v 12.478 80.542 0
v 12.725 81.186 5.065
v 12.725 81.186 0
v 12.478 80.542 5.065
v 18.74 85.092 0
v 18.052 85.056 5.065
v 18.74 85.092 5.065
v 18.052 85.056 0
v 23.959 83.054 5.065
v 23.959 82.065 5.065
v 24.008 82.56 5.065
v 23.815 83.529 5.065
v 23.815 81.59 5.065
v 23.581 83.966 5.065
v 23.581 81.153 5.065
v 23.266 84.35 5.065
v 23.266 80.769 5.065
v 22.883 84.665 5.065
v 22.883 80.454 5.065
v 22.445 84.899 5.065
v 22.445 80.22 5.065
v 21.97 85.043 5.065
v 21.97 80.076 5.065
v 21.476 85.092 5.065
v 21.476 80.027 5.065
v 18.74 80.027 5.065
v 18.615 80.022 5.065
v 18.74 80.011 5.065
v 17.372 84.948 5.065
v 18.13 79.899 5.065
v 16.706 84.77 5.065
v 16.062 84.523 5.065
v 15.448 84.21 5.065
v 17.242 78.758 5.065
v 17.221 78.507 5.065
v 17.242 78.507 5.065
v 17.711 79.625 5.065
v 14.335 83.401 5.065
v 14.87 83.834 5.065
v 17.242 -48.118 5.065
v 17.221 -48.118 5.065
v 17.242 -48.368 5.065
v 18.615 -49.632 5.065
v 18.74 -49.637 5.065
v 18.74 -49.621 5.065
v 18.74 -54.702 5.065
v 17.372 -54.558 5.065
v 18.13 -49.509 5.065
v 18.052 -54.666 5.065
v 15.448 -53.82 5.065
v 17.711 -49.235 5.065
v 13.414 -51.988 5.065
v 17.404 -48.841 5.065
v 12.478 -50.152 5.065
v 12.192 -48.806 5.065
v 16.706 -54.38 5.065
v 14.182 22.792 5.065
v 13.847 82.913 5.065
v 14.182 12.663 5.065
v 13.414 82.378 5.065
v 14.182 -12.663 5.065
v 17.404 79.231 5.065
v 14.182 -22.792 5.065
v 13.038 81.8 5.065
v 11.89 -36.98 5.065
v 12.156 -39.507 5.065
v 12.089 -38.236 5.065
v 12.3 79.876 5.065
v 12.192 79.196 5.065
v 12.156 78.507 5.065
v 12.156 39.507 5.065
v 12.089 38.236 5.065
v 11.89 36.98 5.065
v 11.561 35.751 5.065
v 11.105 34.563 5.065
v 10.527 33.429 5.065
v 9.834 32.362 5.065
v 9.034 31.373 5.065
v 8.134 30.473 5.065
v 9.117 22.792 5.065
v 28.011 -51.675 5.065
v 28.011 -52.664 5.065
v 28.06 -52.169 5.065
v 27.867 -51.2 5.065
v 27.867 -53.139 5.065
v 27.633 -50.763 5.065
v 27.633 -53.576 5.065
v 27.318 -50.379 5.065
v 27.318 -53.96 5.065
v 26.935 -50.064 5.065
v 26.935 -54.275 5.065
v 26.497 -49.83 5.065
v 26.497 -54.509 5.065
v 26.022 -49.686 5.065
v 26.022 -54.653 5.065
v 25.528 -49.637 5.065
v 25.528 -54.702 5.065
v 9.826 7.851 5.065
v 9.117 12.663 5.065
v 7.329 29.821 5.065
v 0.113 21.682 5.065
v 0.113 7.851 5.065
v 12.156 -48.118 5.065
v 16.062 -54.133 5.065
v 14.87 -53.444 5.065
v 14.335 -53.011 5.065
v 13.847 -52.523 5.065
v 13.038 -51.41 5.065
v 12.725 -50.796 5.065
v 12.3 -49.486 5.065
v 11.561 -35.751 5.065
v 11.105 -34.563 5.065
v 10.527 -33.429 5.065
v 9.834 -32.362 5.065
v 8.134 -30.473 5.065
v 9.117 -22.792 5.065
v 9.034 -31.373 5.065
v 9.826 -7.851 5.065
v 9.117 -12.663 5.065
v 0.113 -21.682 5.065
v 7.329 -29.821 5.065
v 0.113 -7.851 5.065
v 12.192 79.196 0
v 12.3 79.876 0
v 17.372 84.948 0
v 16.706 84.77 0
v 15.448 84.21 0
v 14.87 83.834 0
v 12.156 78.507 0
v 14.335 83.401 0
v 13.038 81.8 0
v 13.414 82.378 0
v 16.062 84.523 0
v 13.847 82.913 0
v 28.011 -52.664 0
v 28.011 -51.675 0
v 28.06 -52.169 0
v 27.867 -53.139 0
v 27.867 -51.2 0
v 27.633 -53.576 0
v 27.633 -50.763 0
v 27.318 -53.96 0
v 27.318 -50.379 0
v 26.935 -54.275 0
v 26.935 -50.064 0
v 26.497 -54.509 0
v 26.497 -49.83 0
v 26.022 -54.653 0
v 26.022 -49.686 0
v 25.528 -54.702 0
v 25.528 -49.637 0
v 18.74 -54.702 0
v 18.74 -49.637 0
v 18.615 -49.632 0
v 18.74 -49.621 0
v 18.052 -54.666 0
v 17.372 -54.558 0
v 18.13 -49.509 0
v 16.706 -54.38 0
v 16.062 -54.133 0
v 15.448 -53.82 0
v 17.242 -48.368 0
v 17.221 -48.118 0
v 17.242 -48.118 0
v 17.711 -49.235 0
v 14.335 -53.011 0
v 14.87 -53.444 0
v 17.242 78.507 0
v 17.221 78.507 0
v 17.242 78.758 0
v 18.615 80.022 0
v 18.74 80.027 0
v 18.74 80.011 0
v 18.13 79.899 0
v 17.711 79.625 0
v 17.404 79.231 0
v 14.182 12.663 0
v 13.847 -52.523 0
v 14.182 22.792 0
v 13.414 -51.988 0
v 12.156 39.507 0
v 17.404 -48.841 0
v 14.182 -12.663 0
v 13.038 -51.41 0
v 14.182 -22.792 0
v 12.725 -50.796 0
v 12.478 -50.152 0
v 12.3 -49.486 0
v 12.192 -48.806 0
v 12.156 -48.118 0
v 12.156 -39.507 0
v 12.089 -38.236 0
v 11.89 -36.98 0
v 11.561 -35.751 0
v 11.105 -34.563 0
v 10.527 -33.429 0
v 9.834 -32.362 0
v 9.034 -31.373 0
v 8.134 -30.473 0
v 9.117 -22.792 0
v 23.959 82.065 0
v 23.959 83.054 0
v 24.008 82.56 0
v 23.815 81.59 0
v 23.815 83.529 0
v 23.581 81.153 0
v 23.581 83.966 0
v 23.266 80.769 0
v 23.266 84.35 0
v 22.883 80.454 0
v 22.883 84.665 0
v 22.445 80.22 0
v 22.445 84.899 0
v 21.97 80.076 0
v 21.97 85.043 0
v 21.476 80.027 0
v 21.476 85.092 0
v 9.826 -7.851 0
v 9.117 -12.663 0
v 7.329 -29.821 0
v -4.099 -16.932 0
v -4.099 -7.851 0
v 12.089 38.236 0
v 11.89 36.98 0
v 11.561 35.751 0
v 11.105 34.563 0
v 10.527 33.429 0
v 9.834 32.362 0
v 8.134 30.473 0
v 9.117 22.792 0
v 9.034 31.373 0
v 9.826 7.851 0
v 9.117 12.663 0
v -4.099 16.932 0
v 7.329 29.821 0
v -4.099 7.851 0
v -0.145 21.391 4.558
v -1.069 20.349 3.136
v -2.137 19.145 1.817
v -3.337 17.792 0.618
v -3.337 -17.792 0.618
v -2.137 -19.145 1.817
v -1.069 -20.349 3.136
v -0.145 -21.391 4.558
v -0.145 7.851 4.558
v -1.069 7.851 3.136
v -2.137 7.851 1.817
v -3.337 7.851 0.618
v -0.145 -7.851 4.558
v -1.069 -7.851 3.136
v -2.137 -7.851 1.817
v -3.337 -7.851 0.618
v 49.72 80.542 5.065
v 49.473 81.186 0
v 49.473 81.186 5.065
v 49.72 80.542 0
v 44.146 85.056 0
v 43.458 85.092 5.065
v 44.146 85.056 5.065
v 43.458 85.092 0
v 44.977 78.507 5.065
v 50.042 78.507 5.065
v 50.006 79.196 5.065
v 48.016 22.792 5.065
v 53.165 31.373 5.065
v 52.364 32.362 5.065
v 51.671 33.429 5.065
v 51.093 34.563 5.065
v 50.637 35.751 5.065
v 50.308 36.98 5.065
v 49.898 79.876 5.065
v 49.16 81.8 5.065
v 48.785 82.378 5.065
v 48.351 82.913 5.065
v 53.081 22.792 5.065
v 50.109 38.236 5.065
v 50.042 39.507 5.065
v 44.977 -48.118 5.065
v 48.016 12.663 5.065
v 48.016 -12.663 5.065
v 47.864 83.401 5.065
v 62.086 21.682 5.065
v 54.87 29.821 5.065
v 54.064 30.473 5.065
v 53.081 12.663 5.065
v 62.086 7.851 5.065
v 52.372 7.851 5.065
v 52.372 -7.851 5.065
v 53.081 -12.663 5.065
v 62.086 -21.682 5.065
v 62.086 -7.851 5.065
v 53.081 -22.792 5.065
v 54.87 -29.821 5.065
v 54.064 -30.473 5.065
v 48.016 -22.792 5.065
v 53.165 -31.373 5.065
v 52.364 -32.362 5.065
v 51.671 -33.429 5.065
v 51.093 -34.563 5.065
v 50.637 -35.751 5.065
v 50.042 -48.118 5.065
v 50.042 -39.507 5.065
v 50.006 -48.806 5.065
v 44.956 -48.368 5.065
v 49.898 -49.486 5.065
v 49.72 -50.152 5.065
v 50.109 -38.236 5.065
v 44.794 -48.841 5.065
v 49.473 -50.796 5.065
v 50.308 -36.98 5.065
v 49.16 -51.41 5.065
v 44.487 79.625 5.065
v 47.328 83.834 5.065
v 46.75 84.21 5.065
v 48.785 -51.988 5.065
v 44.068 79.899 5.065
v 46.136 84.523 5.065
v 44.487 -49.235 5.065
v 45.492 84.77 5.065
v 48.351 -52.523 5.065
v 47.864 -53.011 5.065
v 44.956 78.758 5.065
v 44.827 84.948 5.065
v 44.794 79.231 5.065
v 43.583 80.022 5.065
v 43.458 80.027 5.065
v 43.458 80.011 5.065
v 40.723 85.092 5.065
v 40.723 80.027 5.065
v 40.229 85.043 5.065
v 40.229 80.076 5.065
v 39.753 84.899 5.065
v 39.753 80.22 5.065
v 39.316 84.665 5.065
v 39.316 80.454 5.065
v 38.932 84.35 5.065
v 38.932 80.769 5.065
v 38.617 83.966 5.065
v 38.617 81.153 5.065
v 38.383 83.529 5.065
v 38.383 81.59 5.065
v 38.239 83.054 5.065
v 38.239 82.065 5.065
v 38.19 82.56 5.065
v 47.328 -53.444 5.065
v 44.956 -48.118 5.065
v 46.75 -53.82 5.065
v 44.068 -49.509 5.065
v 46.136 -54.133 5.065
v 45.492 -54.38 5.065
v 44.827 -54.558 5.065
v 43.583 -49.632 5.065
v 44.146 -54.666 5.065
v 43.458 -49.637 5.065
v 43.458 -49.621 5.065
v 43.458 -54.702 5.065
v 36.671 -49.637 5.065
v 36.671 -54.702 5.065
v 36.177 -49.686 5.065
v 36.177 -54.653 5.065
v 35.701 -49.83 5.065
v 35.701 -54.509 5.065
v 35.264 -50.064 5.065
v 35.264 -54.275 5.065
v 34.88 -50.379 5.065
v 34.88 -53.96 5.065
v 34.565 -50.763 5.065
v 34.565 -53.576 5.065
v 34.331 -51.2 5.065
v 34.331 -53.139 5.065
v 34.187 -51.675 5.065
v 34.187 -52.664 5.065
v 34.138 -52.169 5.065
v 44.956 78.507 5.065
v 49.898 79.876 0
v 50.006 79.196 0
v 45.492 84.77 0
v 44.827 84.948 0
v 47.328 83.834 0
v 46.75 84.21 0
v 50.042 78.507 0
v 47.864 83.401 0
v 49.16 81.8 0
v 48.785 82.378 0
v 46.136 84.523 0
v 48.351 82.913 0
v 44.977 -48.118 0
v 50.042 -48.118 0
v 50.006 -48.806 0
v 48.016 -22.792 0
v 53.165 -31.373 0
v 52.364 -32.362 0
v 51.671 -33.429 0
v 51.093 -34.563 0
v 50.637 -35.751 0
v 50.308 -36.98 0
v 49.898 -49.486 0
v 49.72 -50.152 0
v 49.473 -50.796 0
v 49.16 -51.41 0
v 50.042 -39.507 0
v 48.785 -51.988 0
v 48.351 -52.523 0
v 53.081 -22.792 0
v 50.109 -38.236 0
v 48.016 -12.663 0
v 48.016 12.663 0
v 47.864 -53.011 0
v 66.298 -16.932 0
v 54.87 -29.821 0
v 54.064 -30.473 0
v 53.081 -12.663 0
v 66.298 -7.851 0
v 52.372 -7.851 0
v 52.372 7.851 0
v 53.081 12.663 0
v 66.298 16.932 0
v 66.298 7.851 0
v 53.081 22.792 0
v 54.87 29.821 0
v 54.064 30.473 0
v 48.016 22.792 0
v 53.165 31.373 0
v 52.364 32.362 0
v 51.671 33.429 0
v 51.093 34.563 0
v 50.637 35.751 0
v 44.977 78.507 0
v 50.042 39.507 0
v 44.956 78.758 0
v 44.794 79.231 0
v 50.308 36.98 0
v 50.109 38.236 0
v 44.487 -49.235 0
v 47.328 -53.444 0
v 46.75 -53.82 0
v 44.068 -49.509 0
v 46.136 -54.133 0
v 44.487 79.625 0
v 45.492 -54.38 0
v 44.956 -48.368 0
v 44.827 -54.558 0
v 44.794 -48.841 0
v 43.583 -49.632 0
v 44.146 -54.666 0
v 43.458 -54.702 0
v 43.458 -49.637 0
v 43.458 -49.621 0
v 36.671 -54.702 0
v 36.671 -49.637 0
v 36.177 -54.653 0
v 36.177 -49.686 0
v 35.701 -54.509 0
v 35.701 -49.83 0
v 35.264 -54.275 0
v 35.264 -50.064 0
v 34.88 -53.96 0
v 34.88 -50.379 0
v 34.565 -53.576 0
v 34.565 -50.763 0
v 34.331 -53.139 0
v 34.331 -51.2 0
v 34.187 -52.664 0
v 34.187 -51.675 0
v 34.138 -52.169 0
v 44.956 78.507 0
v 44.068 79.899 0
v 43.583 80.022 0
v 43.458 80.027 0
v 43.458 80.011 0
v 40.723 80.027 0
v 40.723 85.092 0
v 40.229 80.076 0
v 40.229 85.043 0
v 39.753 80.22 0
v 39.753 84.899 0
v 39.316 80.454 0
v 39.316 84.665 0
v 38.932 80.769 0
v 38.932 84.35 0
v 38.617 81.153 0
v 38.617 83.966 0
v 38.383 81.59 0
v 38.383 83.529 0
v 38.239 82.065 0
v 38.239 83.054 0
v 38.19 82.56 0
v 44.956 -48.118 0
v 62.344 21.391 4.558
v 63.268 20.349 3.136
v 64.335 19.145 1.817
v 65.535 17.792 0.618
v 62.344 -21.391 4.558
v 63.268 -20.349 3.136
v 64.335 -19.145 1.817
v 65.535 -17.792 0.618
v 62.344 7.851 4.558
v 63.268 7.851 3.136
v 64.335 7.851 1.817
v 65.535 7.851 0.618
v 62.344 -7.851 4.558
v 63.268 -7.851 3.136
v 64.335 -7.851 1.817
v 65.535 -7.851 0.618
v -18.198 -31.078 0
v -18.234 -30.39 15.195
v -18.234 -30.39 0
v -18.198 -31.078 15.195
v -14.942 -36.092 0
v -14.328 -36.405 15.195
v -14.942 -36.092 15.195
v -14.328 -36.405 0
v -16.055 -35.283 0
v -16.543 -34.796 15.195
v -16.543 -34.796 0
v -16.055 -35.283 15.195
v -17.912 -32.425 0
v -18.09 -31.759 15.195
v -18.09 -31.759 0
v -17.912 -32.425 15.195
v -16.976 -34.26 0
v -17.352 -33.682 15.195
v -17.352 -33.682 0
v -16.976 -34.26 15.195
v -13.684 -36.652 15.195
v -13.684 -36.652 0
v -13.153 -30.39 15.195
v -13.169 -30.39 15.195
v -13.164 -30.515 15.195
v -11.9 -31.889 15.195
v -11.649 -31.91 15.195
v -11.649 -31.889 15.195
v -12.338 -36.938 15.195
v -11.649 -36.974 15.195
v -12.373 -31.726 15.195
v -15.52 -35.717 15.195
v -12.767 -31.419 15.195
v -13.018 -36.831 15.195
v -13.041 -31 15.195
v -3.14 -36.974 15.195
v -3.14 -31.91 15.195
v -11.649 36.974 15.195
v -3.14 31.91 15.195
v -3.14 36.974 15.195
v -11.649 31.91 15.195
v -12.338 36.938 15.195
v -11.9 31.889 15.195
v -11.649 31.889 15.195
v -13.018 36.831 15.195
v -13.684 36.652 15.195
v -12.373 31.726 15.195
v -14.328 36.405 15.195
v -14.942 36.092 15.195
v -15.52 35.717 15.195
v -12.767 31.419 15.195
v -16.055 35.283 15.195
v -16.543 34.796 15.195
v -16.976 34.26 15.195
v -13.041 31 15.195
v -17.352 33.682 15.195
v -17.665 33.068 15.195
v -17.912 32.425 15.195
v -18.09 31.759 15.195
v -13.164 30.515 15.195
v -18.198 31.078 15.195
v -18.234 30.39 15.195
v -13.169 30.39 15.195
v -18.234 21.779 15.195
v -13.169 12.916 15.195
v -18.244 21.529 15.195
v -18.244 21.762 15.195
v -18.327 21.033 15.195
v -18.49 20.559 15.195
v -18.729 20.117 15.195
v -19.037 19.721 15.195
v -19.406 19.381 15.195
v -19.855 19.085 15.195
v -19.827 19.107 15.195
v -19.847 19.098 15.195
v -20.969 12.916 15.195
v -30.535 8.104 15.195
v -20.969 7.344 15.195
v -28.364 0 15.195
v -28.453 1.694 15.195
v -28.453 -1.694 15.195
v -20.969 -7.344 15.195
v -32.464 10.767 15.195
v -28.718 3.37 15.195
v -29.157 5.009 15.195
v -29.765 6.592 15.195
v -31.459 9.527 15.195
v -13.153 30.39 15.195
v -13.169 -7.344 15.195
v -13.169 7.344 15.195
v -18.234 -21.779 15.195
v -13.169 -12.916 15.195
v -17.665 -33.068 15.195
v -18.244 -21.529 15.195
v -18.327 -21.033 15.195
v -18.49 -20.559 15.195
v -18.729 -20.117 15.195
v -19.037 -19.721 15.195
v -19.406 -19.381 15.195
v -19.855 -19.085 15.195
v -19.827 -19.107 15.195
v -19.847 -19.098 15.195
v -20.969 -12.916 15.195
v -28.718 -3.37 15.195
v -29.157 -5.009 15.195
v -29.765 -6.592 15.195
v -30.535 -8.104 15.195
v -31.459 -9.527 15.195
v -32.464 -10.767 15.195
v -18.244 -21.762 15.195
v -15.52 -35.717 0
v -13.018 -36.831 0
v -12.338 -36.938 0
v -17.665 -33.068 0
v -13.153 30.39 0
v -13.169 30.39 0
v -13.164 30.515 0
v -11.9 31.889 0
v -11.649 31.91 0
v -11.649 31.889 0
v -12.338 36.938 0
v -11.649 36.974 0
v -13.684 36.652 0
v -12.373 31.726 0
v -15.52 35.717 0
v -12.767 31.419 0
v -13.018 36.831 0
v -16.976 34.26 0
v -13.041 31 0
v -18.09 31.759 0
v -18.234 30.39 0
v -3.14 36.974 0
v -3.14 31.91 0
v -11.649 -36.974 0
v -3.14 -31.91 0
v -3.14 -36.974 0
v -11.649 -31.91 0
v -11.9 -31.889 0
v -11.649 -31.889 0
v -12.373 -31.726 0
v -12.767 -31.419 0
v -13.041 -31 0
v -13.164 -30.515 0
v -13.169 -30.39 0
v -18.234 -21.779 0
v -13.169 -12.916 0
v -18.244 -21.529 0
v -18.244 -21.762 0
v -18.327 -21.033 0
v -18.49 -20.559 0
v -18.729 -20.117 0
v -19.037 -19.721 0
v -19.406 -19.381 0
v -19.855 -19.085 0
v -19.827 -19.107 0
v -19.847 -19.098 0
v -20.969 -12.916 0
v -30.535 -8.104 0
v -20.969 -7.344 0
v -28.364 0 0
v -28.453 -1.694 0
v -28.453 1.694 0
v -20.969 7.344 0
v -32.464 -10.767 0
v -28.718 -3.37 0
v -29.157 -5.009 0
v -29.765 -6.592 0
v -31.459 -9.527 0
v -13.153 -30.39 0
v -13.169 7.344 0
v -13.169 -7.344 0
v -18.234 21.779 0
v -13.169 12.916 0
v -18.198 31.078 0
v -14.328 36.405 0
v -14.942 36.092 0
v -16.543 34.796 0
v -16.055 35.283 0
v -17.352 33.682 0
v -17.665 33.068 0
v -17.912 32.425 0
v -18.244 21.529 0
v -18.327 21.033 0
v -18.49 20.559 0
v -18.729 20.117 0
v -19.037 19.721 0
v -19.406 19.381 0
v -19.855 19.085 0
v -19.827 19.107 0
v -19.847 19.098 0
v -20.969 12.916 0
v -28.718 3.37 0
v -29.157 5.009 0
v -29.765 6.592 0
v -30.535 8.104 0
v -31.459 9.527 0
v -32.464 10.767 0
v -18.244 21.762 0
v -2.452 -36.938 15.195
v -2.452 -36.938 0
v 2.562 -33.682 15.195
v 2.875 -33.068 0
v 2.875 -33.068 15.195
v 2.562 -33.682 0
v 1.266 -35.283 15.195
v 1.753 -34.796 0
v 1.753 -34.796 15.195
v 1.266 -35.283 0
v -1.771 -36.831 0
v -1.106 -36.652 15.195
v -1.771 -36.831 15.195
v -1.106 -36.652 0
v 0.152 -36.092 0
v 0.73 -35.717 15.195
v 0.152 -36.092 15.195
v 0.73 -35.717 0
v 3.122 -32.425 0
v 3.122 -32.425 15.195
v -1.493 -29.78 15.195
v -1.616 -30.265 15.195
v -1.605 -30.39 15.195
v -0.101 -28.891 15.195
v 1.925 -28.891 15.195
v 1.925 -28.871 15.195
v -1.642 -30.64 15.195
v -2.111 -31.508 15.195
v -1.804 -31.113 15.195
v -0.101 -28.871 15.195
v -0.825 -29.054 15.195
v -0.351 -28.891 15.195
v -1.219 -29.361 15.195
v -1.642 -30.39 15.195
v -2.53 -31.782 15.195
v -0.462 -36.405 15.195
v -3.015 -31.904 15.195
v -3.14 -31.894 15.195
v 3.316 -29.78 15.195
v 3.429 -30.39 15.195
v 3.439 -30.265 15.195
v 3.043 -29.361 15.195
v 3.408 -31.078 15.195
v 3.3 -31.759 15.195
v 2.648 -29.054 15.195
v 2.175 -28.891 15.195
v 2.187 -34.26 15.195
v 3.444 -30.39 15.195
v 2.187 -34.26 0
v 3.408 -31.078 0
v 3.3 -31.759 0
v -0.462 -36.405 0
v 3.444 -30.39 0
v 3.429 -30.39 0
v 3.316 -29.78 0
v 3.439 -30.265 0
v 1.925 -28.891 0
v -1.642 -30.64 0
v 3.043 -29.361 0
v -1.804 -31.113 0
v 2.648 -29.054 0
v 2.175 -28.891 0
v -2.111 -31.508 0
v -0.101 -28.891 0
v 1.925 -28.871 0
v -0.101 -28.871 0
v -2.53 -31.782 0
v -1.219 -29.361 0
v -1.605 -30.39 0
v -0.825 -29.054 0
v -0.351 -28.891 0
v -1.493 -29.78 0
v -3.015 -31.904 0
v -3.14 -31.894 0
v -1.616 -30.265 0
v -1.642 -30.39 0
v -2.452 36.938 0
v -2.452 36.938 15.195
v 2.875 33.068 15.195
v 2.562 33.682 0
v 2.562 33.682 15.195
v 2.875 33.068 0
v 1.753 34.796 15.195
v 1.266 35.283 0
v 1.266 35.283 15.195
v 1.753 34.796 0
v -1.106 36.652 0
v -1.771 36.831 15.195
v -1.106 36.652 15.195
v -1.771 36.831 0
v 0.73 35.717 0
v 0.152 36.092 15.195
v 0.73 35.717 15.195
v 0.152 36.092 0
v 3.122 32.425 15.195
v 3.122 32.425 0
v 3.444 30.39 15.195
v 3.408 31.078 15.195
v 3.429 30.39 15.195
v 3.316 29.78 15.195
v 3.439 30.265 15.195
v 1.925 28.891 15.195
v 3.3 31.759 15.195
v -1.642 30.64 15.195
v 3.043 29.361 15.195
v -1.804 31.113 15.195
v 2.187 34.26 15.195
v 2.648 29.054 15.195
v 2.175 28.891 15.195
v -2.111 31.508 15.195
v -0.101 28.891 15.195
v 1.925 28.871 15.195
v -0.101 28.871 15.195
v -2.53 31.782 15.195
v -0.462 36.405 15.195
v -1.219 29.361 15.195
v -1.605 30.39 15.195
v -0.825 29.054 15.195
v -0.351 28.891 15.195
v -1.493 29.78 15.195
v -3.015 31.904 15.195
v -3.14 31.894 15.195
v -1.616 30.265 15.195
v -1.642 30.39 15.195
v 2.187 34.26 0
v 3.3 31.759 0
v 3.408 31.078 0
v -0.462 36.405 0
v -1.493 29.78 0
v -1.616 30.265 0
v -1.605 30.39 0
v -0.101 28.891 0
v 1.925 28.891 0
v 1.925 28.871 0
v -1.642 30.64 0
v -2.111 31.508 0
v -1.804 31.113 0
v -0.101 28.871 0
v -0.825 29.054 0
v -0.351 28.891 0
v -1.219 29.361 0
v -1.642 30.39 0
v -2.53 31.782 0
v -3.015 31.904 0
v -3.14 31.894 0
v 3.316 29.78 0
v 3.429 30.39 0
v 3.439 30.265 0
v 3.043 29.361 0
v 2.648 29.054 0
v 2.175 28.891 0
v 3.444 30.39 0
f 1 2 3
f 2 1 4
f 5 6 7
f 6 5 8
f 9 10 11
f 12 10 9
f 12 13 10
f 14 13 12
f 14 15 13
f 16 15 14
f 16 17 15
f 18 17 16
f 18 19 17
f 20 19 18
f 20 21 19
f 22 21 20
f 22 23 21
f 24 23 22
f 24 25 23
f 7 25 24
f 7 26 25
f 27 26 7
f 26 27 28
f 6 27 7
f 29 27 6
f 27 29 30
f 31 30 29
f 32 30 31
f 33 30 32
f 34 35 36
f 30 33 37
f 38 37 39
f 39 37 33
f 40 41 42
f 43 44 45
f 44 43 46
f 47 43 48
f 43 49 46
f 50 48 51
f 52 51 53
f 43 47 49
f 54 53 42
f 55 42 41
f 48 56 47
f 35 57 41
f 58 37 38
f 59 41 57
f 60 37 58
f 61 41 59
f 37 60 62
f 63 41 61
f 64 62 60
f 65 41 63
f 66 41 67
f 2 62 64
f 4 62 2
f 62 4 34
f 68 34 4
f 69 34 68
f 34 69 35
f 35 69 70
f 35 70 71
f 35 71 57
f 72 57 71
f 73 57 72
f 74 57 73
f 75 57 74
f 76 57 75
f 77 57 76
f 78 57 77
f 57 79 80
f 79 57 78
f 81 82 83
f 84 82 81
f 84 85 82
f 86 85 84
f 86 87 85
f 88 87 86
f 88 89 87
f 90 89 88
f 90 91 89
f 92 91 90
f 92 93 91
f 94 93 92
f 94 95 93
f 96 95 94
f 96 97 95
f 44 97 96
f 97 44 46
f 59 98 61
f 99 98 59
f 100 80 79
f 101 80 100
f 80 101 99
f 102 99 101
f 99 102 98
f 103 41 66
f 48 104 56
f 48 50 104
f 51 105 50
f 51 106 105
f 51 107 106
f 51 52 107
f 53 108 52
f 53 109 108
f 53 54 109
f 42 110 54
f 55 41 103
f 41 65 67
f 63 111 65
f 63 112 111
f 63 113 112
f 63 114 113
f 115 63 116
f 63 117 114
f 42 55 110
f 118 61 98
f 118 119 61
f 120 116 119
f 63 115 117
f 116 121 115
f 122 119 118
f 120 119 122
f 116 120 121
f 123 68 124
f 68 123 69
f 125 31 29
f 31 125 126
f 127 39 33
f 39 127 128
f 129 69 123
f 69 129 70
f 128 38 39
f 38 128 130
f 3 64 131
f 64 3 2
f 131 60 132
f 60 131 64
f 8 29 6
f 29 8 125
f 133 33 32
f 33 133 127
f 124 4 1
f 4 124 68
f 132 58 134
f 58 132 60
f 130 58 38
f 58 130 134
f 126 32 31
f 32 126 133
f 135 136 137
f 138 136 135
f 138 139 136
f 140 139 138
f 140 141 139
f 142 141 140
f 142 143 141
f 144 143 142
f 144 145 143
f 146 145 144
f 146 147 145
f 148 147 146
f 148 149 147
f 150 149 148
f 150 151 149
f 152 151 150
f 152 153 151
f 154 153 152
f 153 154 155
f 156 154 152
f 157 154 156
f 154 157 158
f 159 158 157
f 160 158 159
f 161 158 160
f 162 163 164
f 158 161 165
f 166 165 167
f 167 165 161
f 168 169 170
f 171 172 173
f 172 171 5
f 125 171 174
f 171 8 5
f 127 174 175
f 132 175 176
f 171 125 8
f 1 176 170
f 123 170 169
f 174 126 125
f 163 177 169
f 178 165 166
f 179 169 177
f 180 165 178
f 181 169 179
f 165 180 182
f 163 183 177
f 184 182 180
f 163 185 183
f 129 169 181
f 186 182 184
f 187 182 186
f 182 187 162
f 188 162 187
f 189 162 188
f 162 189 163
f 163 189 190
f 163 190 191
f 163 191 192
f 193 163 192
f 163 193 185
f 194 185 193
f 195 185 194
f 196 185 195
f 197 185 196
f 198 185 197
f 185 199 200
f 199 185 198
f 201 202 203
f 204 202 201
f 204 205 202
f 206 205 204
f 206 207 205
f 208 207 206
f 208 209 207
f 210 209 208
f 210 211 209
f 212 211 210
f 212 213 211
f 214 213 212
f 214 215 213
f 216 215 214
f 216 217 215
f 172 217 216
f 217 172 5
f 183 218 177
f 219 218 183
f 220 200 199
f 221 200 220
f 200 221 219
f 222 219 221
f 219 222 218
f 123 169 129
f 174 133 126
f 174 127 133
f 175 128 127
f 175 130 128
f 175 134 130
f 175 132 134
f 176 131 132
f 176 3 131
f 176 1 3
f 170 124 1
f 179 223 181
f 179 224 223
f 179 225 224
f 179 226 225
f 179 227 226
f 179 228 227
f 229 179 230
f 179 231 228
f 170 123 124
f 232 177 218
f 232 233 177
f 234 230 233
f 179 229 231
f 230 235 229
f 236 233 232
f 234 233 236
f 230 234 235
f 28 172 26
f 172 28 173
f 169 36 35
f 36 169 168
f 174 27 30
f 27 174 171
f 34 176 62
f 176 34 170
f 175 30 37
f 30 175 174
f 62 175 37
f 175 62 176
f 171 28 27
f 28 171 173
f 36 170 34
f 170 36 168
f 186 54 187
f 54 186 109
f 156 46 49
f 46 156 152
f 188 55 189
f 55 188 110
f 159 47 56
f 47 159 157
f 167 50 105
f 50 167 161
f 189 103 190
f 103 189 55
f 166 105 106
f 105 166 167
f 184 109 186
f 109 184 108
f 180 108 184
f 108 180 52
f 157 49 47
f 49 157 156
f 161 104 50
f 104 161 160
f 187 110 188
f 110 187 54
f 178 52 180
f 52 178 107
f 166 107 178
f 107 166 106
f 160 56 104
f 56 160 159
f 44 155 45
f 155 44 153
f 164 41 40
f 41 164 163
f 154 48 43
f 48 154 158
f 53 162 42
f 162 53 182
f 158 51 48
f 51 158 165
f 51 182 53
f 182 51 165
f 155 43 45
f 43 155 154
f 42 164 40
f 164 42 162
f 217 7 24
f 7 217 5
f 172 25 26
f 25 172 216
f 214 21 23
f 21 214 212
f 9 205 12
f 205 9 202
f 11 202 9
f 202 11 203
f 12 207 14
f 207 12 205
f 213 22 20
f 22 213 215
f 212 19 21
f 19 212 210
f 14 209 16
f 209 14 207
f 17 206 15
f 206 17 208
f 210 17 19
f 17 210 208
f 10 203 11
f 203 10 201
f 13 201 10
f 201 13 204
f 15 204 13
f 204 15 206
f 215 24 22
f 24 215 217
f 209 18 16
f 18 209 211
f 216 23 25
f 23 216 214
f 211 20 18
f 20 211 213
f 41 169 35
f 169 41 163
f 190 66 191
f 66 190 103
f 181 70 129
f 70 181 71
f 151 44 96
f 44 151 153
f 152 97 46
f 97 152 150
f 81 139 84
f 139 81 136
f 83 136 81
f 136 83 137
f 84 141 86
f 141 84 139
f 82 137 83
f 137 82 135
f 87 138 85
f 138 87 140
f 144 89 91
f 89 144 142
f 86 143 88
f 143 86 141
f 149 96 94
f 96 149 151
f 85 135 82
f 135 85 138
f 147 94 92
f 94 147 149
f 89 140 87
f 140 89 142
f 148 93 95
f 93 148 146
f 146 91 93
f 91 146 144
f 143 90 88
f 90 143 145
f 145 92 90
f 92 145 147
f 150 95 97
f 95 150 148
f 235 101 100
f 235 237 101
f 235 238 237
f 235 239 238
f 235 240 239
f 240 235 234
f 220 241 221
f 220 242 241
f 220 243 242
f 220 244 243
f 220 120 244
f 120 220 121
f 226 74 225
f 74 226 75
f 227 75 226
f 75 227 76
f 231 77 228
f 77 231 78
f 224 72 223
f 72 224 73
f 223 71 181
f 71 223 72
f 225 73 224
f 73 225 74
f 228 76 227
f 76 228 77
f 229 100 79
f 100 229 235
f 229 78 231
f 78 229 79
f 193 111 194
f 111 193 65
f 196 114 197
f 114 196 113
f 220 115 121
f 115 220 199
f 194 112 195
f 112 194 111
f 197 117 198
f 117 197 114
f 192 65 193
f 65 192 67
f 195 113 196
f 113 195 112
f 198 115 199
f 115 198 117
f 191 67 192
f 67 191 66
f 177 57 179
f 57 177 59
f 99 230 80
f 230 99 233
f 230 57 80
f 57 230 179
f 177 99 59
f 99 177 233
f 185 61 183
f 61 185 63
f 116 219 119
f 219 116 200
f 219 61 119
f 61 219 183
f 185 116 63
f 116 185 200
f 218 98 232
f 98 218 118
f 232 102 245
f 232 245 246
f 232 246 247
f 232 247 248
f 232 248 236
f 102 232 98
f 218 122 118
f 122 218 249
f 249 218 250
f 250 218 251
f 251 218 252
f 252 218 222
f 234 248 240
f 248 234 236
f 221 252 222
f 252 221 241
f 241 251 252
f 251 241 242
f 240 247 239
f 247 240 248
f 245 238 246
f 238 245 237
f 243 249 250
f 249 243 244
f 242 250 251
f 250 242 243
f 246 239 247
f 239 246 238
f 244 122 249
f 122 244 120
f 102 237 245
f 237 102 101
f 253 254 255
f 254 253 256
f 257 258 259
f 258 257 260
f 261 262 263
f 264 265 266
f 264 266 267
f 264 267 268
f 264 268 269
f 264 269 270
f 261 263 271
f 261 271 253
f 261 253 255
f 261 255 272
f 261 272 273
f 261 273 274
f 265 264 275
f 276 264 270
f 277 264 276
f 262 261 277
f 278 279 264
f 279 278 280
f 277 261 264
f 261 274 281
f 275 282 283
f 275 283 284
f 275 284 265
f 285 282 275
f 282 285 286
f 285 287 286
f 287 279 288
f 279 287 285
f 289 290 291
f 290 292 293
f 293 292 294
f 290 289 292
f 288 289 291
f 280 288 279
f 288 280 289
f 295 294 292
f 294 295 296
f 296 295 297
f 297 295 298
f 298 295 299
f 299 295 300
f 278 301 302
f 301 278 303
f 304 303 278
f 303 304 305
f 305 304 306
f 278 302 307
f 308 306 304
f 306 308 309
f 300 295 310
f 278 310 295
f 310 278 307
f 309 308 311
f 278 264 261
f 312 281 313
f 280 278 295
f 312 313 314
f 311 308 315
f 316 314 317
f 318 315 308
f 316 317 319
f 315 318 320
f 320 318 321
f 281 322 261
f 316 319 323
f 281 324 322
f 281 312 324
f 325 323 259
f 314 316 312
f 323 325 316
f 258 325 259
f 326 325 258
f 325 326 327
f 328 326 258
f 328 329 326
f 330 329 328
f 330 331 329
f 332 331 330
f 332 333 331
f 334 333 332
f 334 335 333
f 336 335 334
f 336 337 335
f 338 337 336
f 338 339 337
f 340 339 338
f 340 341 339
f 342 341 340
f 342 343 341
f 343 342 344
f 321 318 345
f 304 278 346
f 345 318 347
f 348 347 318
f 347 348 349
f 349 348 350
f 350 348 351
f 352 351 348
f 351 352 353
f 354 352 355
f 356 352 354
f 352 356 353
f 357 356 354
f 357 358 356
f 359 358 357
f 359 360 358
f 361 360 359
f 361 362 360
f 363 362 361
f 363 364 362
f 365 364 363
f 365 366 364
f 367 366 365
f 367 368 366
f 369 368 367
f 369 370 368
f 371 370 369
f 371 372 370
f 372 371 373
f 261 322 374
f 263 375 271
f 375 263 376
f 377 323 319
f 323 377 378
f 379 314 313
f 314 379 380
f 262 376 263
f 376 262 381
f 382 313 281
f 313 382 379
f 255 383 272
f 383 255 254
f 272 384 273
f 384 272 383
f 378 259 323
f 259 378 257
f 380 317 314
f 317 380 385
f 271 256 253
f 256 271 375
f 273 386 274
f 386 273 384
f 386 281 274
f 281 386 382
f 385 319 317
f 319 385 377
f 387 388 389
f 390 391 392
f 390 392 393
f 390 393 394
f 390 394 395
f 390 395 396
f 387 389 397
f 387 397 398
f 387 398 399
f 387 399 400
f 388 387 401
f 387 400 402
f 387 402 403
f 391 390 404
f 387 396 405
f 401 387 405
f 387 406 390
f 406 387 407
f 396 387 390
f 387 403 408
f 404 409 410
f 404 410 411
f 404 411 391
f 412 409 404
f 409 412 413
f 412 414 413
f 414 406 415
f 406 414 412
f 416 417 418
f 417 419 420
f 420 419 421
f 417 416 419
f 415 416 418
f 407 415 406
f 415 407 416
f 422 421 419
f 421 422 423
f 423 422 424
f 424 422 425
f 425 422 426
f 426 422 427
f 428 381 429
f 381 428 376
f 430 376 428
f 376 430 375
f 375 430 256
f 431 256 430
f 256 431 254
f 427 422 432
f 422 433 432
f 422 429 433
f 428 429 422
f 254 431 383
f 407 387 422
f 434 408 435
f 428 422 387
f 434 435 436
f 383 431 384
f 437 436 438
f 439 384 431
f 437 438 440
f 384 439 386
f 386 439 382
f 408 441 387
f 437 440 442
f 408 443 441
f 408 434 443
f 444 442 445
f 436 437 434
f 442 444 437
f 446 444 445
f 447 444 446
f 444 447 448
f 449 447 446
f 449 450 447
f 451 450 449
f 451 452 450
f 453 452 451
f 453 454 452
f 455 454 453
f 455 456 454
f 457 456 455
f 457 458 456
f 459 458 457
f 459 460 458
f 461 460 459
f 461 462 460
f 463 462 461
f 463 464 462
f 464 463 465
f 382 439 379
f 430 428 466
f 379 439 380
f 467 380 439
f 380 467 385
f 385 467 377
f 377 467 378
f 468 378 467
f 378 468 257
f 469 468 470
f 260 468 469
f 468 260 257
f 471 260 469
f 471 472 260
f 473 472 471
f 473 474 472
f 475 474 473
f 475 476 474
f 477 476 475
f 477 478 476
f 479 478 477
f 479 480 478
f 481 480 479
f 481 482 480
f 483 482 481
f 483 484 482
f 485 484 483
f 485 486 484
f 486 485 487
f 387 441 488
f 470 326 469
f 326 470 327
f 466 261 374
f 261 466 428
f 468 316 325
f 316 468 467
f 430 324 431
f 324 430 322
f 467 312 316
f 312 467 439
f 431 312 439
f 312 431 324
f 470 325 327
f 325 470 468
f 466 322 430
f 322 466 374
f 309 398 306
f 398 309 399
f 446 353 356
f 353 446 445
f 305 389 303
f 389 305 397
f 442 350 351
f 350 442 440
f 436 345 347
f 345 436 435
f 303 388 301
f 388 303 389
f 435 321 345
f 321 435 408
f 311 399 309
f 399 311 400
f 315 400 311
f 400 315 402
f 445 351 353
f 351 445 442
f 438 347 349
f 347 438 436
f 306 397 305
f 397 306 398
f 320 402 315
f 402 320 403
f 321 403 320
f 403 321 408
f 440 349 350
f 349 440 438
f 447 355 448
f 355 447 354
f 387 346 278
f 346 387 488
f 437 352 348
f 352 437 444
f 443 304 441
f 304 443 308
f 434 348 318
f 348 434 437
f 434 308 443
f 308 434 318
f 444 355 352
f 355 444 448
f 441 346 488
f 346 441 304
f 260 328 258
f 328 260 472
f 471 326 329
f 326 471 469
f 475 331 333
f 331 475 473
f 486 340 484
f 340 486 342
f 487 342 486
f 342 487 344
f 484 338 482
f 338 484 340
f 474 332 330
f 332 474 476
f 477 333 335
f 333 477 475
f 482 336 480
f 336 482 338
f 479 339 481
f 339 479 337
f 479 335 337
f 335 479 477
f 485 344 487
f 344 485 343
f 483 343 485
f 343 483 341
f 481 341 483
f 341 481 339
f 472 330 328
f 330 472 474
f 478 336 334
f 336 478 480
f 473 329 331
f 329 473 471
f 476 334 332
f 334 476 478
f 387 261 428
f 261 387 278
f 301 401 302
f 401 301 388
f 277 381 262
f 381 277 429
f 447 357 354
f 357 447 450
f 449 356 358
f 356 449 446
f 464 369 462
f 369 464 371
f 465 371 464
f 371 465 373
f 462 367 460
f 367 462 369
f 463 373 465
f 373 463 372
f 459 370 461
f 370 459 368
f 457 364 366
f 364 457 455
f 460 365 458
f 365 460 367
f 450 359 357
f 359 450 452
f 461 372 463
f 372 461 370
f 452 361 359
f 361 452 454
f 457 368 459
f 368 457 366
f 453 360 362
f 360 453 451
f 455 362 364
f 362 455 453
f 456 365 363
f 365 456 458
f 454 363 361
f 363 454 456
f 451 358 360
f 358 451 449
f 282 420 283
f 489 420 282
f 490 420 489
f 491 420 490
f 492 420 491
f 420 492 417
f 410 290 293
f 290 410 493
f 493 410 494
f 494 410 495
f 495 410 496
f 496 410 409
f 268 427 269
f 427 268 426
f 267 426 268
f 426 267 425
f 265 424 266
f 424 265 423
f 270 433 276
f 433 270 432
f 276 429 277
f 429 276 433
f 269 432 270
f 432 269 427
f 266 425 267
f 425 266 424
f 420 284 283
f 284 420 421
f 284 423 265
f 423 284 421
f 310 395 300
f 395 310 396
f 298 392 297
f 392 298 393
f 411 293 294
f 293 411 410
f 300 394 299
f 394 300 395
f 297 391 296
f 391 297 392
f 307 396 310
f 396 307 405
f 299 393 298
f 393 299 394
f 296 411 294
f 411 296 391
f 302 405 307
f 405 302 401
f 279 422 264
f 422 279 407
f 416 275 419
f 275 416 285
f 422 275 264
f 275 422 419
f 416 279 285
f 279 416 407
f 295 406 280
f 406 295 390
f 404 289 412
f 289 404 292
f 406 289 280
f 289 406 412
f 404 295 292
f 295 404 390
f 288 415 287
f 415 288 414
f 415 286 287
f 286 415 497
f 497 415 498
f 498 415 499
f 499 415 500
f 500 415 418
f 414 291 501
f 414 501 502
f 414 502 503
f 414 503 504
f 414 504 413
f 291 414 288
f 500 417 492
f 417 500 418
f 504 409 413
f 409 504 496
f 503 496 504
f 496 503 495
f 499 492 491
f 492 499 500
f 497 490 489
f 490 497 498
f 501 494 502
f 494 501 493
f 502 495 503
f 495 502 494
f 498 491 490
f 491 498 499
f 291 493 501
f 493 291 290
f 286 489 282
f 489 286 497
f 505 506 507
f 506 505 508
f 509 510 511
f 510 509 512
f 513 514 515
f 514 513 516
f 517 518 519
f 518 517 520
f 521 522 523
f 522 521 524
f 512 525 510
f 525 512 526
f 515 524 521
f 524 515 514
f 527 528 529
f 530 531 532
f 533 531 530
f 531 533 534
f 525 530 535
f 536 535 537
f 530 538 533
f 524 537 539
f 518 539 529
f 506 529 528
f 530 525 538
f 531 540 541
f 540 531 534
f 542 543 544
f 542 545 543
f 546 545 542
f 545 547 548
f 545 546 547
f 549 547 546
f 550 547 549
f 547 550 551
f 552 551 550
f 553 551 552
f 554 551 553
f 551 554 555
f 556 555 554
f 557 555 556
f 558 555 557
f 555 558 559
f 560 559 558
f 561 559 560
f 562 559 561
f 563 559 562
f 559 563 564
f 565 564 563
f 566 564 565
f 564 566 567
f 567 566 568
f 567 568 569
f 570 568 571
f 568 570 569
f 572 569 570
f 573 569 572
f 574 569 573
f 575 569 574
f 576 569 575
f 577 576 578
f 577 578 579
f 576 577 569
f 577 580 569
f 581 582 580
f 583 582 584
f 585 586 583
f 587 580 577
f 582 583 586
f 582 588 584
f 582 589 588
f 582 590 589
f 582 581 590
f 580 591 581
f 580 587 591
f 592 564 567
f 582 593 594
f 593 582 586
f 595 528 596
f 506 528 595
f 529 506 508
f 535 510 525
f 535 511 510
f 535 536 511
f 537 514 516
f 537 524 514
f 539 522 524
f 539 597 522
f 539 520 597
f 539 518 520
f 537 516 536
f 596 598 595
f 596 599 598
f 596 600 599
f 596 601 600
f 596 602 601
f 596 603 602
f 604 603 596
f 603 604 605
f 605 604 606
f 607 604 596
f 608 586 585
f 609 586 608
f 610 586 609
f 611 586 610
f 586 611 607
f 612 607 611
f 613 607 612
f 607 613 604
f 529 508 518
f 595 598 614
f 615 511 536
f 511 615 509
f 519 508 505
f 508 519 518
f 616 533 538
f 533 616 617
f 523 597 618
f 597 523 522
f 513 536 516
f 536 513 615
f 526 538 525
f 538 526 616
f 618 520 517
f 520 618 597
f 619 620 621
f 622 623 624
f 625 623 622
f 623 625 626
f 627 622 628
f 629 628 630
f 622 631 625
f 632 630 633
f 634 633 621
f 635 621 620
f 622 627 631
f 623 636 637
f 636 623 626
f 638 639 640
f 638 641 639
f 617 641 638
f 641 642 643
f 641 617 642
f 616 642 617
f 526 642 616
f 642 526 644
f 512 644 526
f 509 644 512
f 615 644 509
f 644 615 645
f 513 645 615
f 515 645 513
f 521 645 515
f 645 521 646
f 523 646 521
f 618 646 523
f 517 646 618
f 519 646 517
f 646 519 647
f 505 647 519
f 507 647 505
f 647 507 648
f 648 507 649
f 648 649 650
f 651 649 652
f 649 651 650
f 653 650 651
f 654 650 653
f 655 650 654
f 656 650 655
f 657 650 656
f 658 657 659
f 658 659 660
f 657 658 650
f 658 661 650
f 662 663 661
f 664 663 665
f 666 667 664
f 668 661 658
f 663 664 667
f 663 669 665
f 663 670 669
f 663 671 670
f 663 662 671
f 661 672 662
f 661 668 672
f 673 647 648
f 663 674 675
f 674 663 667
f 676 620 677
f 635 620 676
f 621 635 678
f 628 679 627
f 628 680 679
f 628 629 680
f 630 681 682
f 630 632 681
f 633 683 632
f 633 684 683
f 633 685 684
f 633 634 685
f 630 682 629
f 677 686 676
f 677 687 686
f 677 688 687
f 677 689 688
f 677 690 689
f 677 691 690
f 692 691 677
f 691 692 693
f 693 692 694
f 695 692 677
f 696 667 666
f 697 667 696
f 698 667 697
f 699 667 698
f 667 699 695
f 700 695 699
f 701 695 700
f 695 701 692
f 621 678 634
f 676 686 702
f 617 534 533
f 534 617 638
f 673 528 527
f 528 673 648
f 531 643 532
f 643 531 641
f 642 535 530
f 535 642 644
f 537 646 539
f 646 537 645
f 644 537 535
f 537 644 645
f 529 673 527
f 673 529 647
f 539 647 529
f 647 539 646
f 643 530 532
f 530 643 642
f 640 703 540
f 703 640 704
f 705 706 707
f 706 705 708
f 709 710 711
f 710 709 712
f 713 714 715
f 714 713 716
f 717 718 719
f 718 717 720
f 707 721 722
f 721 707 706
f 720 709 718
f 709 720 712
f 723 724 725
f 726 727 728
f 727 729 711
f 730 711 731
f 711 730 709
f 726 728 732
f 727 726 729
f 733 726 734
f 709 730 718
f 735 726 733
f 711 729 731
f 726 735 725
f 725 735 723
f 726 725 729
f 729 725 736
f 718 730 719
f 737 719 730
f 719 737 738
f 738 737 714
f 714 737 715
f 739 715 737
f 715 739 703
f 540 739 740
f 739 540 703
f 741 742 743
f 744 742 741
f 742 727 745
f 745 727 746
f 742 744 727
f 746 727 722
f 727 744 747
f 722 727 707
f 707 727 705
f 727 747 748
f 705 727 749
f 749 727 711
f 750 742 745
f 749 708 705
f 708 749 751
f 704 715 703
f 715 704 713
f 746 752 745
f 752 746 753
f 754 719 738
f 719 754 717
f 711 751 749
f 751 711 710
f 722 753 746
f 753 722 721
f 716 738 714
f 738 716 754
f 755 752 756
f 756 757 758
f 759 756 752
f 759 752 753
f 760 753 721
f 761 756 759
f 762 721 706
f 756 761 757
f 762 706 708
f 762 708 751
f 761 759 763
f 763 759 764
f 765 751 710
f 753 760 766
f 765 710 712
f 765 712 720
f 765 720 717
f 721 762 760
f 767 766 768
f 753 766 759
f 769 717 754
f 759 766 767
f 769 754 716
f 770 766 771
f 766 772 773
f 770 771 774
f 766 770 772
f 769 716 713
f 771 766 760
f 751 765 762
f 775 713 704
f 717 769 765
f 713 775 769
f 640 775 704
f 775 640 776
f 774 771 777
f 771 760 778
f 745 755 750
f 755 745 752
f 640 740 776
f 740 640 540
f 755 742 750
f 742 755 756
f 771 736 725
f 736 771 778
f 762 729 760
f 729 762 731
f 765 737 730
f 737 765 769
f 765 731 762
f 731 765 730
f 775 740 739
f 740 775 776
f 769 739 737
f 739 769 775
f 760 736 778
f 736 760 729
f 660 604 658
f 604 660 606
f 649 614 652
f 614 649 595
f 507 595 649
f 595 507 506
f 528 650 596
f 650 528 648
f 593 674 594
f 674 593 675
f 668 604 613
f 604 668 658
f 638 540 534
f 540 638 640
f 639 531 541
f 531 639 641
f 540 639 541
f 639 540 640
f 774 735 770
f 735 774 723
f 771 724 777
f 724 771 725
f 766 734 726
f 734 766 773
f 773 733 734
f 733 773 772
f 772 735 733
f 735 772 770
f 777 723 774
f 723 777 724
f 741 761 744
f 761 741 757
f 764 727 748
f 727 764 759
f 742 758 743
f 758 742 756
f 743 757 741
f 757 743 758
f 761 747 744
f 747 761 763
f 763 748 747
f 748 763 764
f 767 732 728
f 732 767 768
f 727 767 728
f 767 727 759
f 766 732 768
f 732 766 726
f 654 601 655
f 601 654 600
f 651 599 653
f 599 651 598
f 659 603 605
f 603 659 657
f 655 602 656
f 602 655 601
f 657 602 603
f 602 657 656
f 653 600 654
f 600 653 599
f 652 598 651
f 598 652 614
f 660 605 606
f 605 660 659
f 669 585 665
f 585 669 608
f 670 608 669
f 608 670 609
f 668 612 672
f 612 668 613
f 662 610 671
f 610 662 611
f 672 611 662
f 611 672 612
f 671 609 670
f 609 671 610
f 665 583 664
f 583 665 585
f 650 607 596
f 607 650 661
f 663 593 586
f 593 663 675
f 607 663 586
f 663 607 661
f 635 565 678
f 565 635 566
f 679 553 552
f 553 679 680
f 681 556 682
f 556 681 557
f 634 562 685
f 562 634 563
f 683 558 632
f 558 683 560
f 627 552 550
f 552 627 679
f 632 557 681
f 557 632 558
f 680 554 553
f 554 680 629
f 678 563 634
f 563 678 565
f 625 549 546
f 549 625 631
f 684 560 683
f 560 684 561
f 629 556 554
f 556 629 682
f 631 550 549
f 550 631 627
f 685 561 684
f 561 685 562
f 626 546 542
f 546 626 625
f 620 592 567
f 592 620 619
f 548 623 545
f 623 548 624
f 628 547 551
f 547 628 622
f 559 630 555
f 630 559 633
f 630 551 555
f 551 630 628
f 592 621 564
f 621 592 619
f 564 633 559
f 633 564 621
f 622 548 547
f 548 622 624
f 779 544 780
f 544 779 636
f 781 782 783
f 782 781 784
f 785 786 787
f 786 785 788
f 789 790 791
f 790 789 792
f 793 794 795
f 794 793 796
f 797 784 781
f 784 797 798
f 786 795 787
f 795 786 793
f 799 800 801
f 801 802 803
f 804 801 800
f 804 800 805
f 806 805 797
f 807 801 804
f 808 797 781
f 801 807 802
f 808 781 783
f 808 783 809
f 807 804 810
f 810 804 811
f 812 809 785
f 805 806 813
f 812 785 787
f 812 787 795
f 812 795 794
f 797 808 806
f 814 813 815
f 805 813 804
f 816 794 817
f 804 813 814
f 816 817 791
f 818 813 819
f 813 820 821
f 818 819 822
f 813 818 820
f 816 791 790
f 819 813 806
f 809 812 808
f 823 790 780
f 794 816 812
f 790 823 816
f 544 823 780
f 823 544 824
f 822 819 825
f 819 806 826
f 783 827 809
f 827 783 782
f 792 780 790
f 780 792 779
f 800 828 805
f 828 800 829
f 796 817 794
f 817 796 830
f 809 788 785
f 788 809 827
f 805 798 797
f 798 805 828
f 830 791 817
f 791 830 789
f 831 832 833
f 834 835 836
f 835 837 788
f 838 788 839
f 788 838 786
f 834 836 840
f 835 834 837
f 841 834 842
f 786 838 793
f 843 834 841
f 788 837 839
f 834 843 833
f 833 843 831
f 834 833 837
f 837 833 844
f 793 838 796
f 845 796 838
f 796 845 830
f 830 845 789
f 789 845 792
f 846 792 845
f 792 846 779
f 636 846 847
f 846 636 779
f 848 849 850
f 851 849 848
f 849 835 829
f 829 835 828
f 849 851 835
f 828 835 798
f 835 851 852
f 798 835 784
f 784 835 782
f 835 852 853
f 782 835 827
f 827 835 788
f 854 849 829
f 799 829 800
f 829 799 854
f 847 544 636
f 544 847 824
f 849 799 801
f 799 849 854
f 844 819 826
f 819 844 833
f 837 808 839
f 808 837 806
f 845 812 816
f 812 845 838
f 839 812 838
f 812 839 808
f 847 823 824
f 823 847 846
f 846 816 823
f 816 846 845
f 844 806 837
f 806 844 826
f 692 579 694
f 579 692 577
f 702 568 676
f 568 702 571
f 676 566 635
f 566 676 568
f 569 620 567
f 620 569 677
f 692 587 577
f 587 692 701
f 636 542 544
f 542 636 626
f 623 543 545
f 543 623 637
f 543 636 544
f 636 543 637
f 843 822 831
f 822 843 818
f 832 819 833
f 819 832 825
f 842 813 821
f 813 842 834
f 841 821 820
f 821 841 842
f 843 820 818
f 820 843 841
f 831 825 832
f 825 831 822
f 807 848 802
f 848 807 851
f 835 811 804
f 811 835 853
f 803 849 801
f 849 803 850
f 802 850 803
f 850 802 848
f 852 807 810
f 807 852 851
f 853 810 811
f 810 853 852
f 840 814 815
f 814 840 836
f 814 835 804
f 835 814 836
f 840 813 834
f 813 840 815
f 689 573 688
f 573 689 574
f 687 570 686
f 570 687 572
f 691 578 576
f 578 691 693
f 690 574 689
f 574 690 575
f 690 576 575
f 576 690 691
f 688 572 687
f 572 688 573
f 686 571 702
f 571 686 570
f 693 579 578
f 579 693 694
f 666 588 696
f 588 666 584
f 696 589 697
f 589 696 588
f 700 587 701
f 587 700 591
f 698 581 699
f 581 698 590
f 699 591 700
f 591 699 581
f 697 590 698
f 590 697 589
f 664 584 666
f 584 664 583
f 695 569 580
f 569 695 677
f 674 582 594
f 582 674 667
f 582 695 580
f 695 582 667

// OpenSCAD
// Depending on your printer, you should add an extra 1 to 2 mm.
Phone_Length=128;

// Depending on your printer, you should add an extra 1 to 2 mm.
Phone_Width=63;

// Depending on your printer, you should add an extra 1 to 2 mm.
Phone_Thickness = 11.4;

// Offset the phone vertically. This is useful if your phone have side buttons at the middle that is blocked by the side grip. A positive value will shift the phone upwards, while a negative value shifts it downwards.
Vertical_Offset = 15;

// Allow you to attach two vertical pieces instead of one. This can be useful if you want to charge your phone while it's in the holder.
Dual_Vertical = 10; // [0:10]

// Trade off between improved grip and ease of insertion/removal. Increasing this number will increase height of the top catch, improving grip but making it harder to remove the phone. The default should be fine for most cases.
Grip = -3; // [-10:10]

// Diameter of the bar where the holder is to be mounted.
Handle_Bar_Diameter = 32;
// Distance from the handle bar to the back of the phone. A smaller number will give a lower profile.
Holder_Height = 15; // [11:20]

// Fatness of Handlebarholder
Holder_Fat = 15; // [5:15]

// Scale. Have to scale for ABS shrinking
scaleing = 1.013;


/* [Hidden] */
$fs = 0.5;
$fa = 6;

scale([scaleing,scaleing,scaleing]) {
 translate([0,0,0])   Vertical_Piece();
    if(Dual_Vertical > 0) {
 translate([35+Holder_Height+Phone_Thickness,0,0])  mirror([1,0,0]) Vertical_Piece();
    }
translate([-30,0,0])    Horizontal_Piece();
}




module copy_mirror(vec=[0,1,0]) {
 union() {
  children();
  mirror(vec) children();
 }
};

module rounded_corner(vec=[0,0,0],rot=0,h=5) {
 translate(vec) rotate([0,0,rot]) difference(){
  intersection(){
   cylinder(r=6.5,h=h);
   translate([-6.5,0,0]) cube([6.5,6.5,h]);
  };
  translate([0,0,-1]) cylinder(r=1.5,h=h+2);
 };
};



module Vertical_Piece() {
// Vertical Piece
//translate([2.5,0,0]) rotate([0,-90,0]) difference(){
difference(){
 union() {
  translate ([0,Vertical_Offset,0]) union(){
   translate([18.5,Phone_Length/2,0]) cube([Phone_Thickness/2+Grip,5,5]);
   translate([18.5+Phone_Thickness/2+Grip,Phone_Length/2+2.5,0]) cylinder(r=2.5,h=5);
   copy_mirror([0,1,0]) rounded_corner([18.5,Phone_Length/2-1.5,0]);
   translate([12,-Phone_Length/2+1.5,0]) cube([5,Phone_Length-3,5]);
   translate([18.5,-Phone_Length/2-5,0]) cube([Phone_Thickness/2+1,5,5]);
   translate([19.5+Phone_Thickness/2,-Phone_Length/2-2.5,0]) cylinder(r=2.5,h=5);
//   translate([18.5,-Phone_Length/2-5,0]) cube([Phone_Thickness-1.5,5,5]);
//   translate([17+Phone_Thickness,-Phone_Length/2-2.5,0]) cylinder(r=2.5,h=5);
  };
  linear_extrude(height=5) polygon([[12,-39],[12,39],[10.3923,33],[-10,10],[-10,-10],[10.3923,-33]]);
 }
 copy_mirror([0,1,0]) translate([0,39,-1]) cylinder(r=12,h=5+2);
 copy_mirror([0,1,0]) translate([9,12.5,-1]) cube([5,10,5+2]);
 translate([17-Holder_Height-15,-(Holder_Fat+0.5)/2,-1]) cube([Holder_Height/2+0.2+15,Holder_Fat+0.5,5+2]);
 //%translate([-Holder_Height,-30,-1]) cube([17,60,5+2]);

 translate([17-Holder_Height-Handle_Bar_Diameter/2,-30,5/2+Dual_Vertical]) rotate([-90,0,0]) cylinder(r=Handle_Bar_Diameter/2,h=60);
}

}


module Horizontal_Piece() {
// Horizontal Piece
//translate([0,2.5,0]) rotate([90,0,0]) copy_mirror([1,0,0]) difference(){
 rotate([0,0,-90]) copy_mirror([1,0,0]) difference(){
 union(){
//  linear_extrude(height=5) polygon([[0,-3],[10,-3],[14.6768,10.0145],[17.5,12],[Phone_Width/2-1.5,12],[Phone_Width/2-1.5,17],[0,17]]);
  linear_extrude(height=Holder_Fat) polygon([[0,-3],[10,-3],[18.84,10.4],[21.5,12],[Phone_Width/2-1.5,12],[Phone_Width/2-1.5,17],[0,17]]);
  rounded_corner([Phone_Width/2-1.5,18.5,0],180,h=Holder_Fat);
  translate([Phone_Width/2,18.5,0]) cube([5,Phone_Thickness-3,Holder_Fat]);
  rounded_corner([Phone_Width/2-1.5,17+Phone_Thickness-1.5,0],-90,h=Holder_Fat);
  translate([Phone_Width/2-1.5,17+Phone_Thickness+1.5,0]) cylinder(r=1.5,h=Holder_Fat);
  translate([Phone_Width/2-1.5,17+Phone_Thickness+5-1.5,0]) cylinder(r=1.5,h=Holder_Fat);
  translate([Phone_Width/2-3,17+Phone_Thickness+1.5,0]) cube([1.5,2,Holder_Fat]);
//  translate([5.5/2,17,5/2]) rotate([90,0,0]) linear_extrude(height=20) polygon([[0,0],[5,0],[0,5]]);
 };
 translate([21.5,9,-1]) cylinder(r=3,h=Holder_Fat+2);
 translate([0,-Handle_Bar_Diameter/2-Holder_Height+17,-1]) cylinder(r=Handle_Bar_Diameter/2,h=Holder_Fat+2);
 
 translate([-5.5/2+Dual_Vertical,17-(Holder_Height/2+0.2),-1]) cube([5.5,Holder_Height/2+0.2+1,Holder_Fat+2]); // The poorly named Dual_Vertical contains the horizontal offset for the slot.
};
}
